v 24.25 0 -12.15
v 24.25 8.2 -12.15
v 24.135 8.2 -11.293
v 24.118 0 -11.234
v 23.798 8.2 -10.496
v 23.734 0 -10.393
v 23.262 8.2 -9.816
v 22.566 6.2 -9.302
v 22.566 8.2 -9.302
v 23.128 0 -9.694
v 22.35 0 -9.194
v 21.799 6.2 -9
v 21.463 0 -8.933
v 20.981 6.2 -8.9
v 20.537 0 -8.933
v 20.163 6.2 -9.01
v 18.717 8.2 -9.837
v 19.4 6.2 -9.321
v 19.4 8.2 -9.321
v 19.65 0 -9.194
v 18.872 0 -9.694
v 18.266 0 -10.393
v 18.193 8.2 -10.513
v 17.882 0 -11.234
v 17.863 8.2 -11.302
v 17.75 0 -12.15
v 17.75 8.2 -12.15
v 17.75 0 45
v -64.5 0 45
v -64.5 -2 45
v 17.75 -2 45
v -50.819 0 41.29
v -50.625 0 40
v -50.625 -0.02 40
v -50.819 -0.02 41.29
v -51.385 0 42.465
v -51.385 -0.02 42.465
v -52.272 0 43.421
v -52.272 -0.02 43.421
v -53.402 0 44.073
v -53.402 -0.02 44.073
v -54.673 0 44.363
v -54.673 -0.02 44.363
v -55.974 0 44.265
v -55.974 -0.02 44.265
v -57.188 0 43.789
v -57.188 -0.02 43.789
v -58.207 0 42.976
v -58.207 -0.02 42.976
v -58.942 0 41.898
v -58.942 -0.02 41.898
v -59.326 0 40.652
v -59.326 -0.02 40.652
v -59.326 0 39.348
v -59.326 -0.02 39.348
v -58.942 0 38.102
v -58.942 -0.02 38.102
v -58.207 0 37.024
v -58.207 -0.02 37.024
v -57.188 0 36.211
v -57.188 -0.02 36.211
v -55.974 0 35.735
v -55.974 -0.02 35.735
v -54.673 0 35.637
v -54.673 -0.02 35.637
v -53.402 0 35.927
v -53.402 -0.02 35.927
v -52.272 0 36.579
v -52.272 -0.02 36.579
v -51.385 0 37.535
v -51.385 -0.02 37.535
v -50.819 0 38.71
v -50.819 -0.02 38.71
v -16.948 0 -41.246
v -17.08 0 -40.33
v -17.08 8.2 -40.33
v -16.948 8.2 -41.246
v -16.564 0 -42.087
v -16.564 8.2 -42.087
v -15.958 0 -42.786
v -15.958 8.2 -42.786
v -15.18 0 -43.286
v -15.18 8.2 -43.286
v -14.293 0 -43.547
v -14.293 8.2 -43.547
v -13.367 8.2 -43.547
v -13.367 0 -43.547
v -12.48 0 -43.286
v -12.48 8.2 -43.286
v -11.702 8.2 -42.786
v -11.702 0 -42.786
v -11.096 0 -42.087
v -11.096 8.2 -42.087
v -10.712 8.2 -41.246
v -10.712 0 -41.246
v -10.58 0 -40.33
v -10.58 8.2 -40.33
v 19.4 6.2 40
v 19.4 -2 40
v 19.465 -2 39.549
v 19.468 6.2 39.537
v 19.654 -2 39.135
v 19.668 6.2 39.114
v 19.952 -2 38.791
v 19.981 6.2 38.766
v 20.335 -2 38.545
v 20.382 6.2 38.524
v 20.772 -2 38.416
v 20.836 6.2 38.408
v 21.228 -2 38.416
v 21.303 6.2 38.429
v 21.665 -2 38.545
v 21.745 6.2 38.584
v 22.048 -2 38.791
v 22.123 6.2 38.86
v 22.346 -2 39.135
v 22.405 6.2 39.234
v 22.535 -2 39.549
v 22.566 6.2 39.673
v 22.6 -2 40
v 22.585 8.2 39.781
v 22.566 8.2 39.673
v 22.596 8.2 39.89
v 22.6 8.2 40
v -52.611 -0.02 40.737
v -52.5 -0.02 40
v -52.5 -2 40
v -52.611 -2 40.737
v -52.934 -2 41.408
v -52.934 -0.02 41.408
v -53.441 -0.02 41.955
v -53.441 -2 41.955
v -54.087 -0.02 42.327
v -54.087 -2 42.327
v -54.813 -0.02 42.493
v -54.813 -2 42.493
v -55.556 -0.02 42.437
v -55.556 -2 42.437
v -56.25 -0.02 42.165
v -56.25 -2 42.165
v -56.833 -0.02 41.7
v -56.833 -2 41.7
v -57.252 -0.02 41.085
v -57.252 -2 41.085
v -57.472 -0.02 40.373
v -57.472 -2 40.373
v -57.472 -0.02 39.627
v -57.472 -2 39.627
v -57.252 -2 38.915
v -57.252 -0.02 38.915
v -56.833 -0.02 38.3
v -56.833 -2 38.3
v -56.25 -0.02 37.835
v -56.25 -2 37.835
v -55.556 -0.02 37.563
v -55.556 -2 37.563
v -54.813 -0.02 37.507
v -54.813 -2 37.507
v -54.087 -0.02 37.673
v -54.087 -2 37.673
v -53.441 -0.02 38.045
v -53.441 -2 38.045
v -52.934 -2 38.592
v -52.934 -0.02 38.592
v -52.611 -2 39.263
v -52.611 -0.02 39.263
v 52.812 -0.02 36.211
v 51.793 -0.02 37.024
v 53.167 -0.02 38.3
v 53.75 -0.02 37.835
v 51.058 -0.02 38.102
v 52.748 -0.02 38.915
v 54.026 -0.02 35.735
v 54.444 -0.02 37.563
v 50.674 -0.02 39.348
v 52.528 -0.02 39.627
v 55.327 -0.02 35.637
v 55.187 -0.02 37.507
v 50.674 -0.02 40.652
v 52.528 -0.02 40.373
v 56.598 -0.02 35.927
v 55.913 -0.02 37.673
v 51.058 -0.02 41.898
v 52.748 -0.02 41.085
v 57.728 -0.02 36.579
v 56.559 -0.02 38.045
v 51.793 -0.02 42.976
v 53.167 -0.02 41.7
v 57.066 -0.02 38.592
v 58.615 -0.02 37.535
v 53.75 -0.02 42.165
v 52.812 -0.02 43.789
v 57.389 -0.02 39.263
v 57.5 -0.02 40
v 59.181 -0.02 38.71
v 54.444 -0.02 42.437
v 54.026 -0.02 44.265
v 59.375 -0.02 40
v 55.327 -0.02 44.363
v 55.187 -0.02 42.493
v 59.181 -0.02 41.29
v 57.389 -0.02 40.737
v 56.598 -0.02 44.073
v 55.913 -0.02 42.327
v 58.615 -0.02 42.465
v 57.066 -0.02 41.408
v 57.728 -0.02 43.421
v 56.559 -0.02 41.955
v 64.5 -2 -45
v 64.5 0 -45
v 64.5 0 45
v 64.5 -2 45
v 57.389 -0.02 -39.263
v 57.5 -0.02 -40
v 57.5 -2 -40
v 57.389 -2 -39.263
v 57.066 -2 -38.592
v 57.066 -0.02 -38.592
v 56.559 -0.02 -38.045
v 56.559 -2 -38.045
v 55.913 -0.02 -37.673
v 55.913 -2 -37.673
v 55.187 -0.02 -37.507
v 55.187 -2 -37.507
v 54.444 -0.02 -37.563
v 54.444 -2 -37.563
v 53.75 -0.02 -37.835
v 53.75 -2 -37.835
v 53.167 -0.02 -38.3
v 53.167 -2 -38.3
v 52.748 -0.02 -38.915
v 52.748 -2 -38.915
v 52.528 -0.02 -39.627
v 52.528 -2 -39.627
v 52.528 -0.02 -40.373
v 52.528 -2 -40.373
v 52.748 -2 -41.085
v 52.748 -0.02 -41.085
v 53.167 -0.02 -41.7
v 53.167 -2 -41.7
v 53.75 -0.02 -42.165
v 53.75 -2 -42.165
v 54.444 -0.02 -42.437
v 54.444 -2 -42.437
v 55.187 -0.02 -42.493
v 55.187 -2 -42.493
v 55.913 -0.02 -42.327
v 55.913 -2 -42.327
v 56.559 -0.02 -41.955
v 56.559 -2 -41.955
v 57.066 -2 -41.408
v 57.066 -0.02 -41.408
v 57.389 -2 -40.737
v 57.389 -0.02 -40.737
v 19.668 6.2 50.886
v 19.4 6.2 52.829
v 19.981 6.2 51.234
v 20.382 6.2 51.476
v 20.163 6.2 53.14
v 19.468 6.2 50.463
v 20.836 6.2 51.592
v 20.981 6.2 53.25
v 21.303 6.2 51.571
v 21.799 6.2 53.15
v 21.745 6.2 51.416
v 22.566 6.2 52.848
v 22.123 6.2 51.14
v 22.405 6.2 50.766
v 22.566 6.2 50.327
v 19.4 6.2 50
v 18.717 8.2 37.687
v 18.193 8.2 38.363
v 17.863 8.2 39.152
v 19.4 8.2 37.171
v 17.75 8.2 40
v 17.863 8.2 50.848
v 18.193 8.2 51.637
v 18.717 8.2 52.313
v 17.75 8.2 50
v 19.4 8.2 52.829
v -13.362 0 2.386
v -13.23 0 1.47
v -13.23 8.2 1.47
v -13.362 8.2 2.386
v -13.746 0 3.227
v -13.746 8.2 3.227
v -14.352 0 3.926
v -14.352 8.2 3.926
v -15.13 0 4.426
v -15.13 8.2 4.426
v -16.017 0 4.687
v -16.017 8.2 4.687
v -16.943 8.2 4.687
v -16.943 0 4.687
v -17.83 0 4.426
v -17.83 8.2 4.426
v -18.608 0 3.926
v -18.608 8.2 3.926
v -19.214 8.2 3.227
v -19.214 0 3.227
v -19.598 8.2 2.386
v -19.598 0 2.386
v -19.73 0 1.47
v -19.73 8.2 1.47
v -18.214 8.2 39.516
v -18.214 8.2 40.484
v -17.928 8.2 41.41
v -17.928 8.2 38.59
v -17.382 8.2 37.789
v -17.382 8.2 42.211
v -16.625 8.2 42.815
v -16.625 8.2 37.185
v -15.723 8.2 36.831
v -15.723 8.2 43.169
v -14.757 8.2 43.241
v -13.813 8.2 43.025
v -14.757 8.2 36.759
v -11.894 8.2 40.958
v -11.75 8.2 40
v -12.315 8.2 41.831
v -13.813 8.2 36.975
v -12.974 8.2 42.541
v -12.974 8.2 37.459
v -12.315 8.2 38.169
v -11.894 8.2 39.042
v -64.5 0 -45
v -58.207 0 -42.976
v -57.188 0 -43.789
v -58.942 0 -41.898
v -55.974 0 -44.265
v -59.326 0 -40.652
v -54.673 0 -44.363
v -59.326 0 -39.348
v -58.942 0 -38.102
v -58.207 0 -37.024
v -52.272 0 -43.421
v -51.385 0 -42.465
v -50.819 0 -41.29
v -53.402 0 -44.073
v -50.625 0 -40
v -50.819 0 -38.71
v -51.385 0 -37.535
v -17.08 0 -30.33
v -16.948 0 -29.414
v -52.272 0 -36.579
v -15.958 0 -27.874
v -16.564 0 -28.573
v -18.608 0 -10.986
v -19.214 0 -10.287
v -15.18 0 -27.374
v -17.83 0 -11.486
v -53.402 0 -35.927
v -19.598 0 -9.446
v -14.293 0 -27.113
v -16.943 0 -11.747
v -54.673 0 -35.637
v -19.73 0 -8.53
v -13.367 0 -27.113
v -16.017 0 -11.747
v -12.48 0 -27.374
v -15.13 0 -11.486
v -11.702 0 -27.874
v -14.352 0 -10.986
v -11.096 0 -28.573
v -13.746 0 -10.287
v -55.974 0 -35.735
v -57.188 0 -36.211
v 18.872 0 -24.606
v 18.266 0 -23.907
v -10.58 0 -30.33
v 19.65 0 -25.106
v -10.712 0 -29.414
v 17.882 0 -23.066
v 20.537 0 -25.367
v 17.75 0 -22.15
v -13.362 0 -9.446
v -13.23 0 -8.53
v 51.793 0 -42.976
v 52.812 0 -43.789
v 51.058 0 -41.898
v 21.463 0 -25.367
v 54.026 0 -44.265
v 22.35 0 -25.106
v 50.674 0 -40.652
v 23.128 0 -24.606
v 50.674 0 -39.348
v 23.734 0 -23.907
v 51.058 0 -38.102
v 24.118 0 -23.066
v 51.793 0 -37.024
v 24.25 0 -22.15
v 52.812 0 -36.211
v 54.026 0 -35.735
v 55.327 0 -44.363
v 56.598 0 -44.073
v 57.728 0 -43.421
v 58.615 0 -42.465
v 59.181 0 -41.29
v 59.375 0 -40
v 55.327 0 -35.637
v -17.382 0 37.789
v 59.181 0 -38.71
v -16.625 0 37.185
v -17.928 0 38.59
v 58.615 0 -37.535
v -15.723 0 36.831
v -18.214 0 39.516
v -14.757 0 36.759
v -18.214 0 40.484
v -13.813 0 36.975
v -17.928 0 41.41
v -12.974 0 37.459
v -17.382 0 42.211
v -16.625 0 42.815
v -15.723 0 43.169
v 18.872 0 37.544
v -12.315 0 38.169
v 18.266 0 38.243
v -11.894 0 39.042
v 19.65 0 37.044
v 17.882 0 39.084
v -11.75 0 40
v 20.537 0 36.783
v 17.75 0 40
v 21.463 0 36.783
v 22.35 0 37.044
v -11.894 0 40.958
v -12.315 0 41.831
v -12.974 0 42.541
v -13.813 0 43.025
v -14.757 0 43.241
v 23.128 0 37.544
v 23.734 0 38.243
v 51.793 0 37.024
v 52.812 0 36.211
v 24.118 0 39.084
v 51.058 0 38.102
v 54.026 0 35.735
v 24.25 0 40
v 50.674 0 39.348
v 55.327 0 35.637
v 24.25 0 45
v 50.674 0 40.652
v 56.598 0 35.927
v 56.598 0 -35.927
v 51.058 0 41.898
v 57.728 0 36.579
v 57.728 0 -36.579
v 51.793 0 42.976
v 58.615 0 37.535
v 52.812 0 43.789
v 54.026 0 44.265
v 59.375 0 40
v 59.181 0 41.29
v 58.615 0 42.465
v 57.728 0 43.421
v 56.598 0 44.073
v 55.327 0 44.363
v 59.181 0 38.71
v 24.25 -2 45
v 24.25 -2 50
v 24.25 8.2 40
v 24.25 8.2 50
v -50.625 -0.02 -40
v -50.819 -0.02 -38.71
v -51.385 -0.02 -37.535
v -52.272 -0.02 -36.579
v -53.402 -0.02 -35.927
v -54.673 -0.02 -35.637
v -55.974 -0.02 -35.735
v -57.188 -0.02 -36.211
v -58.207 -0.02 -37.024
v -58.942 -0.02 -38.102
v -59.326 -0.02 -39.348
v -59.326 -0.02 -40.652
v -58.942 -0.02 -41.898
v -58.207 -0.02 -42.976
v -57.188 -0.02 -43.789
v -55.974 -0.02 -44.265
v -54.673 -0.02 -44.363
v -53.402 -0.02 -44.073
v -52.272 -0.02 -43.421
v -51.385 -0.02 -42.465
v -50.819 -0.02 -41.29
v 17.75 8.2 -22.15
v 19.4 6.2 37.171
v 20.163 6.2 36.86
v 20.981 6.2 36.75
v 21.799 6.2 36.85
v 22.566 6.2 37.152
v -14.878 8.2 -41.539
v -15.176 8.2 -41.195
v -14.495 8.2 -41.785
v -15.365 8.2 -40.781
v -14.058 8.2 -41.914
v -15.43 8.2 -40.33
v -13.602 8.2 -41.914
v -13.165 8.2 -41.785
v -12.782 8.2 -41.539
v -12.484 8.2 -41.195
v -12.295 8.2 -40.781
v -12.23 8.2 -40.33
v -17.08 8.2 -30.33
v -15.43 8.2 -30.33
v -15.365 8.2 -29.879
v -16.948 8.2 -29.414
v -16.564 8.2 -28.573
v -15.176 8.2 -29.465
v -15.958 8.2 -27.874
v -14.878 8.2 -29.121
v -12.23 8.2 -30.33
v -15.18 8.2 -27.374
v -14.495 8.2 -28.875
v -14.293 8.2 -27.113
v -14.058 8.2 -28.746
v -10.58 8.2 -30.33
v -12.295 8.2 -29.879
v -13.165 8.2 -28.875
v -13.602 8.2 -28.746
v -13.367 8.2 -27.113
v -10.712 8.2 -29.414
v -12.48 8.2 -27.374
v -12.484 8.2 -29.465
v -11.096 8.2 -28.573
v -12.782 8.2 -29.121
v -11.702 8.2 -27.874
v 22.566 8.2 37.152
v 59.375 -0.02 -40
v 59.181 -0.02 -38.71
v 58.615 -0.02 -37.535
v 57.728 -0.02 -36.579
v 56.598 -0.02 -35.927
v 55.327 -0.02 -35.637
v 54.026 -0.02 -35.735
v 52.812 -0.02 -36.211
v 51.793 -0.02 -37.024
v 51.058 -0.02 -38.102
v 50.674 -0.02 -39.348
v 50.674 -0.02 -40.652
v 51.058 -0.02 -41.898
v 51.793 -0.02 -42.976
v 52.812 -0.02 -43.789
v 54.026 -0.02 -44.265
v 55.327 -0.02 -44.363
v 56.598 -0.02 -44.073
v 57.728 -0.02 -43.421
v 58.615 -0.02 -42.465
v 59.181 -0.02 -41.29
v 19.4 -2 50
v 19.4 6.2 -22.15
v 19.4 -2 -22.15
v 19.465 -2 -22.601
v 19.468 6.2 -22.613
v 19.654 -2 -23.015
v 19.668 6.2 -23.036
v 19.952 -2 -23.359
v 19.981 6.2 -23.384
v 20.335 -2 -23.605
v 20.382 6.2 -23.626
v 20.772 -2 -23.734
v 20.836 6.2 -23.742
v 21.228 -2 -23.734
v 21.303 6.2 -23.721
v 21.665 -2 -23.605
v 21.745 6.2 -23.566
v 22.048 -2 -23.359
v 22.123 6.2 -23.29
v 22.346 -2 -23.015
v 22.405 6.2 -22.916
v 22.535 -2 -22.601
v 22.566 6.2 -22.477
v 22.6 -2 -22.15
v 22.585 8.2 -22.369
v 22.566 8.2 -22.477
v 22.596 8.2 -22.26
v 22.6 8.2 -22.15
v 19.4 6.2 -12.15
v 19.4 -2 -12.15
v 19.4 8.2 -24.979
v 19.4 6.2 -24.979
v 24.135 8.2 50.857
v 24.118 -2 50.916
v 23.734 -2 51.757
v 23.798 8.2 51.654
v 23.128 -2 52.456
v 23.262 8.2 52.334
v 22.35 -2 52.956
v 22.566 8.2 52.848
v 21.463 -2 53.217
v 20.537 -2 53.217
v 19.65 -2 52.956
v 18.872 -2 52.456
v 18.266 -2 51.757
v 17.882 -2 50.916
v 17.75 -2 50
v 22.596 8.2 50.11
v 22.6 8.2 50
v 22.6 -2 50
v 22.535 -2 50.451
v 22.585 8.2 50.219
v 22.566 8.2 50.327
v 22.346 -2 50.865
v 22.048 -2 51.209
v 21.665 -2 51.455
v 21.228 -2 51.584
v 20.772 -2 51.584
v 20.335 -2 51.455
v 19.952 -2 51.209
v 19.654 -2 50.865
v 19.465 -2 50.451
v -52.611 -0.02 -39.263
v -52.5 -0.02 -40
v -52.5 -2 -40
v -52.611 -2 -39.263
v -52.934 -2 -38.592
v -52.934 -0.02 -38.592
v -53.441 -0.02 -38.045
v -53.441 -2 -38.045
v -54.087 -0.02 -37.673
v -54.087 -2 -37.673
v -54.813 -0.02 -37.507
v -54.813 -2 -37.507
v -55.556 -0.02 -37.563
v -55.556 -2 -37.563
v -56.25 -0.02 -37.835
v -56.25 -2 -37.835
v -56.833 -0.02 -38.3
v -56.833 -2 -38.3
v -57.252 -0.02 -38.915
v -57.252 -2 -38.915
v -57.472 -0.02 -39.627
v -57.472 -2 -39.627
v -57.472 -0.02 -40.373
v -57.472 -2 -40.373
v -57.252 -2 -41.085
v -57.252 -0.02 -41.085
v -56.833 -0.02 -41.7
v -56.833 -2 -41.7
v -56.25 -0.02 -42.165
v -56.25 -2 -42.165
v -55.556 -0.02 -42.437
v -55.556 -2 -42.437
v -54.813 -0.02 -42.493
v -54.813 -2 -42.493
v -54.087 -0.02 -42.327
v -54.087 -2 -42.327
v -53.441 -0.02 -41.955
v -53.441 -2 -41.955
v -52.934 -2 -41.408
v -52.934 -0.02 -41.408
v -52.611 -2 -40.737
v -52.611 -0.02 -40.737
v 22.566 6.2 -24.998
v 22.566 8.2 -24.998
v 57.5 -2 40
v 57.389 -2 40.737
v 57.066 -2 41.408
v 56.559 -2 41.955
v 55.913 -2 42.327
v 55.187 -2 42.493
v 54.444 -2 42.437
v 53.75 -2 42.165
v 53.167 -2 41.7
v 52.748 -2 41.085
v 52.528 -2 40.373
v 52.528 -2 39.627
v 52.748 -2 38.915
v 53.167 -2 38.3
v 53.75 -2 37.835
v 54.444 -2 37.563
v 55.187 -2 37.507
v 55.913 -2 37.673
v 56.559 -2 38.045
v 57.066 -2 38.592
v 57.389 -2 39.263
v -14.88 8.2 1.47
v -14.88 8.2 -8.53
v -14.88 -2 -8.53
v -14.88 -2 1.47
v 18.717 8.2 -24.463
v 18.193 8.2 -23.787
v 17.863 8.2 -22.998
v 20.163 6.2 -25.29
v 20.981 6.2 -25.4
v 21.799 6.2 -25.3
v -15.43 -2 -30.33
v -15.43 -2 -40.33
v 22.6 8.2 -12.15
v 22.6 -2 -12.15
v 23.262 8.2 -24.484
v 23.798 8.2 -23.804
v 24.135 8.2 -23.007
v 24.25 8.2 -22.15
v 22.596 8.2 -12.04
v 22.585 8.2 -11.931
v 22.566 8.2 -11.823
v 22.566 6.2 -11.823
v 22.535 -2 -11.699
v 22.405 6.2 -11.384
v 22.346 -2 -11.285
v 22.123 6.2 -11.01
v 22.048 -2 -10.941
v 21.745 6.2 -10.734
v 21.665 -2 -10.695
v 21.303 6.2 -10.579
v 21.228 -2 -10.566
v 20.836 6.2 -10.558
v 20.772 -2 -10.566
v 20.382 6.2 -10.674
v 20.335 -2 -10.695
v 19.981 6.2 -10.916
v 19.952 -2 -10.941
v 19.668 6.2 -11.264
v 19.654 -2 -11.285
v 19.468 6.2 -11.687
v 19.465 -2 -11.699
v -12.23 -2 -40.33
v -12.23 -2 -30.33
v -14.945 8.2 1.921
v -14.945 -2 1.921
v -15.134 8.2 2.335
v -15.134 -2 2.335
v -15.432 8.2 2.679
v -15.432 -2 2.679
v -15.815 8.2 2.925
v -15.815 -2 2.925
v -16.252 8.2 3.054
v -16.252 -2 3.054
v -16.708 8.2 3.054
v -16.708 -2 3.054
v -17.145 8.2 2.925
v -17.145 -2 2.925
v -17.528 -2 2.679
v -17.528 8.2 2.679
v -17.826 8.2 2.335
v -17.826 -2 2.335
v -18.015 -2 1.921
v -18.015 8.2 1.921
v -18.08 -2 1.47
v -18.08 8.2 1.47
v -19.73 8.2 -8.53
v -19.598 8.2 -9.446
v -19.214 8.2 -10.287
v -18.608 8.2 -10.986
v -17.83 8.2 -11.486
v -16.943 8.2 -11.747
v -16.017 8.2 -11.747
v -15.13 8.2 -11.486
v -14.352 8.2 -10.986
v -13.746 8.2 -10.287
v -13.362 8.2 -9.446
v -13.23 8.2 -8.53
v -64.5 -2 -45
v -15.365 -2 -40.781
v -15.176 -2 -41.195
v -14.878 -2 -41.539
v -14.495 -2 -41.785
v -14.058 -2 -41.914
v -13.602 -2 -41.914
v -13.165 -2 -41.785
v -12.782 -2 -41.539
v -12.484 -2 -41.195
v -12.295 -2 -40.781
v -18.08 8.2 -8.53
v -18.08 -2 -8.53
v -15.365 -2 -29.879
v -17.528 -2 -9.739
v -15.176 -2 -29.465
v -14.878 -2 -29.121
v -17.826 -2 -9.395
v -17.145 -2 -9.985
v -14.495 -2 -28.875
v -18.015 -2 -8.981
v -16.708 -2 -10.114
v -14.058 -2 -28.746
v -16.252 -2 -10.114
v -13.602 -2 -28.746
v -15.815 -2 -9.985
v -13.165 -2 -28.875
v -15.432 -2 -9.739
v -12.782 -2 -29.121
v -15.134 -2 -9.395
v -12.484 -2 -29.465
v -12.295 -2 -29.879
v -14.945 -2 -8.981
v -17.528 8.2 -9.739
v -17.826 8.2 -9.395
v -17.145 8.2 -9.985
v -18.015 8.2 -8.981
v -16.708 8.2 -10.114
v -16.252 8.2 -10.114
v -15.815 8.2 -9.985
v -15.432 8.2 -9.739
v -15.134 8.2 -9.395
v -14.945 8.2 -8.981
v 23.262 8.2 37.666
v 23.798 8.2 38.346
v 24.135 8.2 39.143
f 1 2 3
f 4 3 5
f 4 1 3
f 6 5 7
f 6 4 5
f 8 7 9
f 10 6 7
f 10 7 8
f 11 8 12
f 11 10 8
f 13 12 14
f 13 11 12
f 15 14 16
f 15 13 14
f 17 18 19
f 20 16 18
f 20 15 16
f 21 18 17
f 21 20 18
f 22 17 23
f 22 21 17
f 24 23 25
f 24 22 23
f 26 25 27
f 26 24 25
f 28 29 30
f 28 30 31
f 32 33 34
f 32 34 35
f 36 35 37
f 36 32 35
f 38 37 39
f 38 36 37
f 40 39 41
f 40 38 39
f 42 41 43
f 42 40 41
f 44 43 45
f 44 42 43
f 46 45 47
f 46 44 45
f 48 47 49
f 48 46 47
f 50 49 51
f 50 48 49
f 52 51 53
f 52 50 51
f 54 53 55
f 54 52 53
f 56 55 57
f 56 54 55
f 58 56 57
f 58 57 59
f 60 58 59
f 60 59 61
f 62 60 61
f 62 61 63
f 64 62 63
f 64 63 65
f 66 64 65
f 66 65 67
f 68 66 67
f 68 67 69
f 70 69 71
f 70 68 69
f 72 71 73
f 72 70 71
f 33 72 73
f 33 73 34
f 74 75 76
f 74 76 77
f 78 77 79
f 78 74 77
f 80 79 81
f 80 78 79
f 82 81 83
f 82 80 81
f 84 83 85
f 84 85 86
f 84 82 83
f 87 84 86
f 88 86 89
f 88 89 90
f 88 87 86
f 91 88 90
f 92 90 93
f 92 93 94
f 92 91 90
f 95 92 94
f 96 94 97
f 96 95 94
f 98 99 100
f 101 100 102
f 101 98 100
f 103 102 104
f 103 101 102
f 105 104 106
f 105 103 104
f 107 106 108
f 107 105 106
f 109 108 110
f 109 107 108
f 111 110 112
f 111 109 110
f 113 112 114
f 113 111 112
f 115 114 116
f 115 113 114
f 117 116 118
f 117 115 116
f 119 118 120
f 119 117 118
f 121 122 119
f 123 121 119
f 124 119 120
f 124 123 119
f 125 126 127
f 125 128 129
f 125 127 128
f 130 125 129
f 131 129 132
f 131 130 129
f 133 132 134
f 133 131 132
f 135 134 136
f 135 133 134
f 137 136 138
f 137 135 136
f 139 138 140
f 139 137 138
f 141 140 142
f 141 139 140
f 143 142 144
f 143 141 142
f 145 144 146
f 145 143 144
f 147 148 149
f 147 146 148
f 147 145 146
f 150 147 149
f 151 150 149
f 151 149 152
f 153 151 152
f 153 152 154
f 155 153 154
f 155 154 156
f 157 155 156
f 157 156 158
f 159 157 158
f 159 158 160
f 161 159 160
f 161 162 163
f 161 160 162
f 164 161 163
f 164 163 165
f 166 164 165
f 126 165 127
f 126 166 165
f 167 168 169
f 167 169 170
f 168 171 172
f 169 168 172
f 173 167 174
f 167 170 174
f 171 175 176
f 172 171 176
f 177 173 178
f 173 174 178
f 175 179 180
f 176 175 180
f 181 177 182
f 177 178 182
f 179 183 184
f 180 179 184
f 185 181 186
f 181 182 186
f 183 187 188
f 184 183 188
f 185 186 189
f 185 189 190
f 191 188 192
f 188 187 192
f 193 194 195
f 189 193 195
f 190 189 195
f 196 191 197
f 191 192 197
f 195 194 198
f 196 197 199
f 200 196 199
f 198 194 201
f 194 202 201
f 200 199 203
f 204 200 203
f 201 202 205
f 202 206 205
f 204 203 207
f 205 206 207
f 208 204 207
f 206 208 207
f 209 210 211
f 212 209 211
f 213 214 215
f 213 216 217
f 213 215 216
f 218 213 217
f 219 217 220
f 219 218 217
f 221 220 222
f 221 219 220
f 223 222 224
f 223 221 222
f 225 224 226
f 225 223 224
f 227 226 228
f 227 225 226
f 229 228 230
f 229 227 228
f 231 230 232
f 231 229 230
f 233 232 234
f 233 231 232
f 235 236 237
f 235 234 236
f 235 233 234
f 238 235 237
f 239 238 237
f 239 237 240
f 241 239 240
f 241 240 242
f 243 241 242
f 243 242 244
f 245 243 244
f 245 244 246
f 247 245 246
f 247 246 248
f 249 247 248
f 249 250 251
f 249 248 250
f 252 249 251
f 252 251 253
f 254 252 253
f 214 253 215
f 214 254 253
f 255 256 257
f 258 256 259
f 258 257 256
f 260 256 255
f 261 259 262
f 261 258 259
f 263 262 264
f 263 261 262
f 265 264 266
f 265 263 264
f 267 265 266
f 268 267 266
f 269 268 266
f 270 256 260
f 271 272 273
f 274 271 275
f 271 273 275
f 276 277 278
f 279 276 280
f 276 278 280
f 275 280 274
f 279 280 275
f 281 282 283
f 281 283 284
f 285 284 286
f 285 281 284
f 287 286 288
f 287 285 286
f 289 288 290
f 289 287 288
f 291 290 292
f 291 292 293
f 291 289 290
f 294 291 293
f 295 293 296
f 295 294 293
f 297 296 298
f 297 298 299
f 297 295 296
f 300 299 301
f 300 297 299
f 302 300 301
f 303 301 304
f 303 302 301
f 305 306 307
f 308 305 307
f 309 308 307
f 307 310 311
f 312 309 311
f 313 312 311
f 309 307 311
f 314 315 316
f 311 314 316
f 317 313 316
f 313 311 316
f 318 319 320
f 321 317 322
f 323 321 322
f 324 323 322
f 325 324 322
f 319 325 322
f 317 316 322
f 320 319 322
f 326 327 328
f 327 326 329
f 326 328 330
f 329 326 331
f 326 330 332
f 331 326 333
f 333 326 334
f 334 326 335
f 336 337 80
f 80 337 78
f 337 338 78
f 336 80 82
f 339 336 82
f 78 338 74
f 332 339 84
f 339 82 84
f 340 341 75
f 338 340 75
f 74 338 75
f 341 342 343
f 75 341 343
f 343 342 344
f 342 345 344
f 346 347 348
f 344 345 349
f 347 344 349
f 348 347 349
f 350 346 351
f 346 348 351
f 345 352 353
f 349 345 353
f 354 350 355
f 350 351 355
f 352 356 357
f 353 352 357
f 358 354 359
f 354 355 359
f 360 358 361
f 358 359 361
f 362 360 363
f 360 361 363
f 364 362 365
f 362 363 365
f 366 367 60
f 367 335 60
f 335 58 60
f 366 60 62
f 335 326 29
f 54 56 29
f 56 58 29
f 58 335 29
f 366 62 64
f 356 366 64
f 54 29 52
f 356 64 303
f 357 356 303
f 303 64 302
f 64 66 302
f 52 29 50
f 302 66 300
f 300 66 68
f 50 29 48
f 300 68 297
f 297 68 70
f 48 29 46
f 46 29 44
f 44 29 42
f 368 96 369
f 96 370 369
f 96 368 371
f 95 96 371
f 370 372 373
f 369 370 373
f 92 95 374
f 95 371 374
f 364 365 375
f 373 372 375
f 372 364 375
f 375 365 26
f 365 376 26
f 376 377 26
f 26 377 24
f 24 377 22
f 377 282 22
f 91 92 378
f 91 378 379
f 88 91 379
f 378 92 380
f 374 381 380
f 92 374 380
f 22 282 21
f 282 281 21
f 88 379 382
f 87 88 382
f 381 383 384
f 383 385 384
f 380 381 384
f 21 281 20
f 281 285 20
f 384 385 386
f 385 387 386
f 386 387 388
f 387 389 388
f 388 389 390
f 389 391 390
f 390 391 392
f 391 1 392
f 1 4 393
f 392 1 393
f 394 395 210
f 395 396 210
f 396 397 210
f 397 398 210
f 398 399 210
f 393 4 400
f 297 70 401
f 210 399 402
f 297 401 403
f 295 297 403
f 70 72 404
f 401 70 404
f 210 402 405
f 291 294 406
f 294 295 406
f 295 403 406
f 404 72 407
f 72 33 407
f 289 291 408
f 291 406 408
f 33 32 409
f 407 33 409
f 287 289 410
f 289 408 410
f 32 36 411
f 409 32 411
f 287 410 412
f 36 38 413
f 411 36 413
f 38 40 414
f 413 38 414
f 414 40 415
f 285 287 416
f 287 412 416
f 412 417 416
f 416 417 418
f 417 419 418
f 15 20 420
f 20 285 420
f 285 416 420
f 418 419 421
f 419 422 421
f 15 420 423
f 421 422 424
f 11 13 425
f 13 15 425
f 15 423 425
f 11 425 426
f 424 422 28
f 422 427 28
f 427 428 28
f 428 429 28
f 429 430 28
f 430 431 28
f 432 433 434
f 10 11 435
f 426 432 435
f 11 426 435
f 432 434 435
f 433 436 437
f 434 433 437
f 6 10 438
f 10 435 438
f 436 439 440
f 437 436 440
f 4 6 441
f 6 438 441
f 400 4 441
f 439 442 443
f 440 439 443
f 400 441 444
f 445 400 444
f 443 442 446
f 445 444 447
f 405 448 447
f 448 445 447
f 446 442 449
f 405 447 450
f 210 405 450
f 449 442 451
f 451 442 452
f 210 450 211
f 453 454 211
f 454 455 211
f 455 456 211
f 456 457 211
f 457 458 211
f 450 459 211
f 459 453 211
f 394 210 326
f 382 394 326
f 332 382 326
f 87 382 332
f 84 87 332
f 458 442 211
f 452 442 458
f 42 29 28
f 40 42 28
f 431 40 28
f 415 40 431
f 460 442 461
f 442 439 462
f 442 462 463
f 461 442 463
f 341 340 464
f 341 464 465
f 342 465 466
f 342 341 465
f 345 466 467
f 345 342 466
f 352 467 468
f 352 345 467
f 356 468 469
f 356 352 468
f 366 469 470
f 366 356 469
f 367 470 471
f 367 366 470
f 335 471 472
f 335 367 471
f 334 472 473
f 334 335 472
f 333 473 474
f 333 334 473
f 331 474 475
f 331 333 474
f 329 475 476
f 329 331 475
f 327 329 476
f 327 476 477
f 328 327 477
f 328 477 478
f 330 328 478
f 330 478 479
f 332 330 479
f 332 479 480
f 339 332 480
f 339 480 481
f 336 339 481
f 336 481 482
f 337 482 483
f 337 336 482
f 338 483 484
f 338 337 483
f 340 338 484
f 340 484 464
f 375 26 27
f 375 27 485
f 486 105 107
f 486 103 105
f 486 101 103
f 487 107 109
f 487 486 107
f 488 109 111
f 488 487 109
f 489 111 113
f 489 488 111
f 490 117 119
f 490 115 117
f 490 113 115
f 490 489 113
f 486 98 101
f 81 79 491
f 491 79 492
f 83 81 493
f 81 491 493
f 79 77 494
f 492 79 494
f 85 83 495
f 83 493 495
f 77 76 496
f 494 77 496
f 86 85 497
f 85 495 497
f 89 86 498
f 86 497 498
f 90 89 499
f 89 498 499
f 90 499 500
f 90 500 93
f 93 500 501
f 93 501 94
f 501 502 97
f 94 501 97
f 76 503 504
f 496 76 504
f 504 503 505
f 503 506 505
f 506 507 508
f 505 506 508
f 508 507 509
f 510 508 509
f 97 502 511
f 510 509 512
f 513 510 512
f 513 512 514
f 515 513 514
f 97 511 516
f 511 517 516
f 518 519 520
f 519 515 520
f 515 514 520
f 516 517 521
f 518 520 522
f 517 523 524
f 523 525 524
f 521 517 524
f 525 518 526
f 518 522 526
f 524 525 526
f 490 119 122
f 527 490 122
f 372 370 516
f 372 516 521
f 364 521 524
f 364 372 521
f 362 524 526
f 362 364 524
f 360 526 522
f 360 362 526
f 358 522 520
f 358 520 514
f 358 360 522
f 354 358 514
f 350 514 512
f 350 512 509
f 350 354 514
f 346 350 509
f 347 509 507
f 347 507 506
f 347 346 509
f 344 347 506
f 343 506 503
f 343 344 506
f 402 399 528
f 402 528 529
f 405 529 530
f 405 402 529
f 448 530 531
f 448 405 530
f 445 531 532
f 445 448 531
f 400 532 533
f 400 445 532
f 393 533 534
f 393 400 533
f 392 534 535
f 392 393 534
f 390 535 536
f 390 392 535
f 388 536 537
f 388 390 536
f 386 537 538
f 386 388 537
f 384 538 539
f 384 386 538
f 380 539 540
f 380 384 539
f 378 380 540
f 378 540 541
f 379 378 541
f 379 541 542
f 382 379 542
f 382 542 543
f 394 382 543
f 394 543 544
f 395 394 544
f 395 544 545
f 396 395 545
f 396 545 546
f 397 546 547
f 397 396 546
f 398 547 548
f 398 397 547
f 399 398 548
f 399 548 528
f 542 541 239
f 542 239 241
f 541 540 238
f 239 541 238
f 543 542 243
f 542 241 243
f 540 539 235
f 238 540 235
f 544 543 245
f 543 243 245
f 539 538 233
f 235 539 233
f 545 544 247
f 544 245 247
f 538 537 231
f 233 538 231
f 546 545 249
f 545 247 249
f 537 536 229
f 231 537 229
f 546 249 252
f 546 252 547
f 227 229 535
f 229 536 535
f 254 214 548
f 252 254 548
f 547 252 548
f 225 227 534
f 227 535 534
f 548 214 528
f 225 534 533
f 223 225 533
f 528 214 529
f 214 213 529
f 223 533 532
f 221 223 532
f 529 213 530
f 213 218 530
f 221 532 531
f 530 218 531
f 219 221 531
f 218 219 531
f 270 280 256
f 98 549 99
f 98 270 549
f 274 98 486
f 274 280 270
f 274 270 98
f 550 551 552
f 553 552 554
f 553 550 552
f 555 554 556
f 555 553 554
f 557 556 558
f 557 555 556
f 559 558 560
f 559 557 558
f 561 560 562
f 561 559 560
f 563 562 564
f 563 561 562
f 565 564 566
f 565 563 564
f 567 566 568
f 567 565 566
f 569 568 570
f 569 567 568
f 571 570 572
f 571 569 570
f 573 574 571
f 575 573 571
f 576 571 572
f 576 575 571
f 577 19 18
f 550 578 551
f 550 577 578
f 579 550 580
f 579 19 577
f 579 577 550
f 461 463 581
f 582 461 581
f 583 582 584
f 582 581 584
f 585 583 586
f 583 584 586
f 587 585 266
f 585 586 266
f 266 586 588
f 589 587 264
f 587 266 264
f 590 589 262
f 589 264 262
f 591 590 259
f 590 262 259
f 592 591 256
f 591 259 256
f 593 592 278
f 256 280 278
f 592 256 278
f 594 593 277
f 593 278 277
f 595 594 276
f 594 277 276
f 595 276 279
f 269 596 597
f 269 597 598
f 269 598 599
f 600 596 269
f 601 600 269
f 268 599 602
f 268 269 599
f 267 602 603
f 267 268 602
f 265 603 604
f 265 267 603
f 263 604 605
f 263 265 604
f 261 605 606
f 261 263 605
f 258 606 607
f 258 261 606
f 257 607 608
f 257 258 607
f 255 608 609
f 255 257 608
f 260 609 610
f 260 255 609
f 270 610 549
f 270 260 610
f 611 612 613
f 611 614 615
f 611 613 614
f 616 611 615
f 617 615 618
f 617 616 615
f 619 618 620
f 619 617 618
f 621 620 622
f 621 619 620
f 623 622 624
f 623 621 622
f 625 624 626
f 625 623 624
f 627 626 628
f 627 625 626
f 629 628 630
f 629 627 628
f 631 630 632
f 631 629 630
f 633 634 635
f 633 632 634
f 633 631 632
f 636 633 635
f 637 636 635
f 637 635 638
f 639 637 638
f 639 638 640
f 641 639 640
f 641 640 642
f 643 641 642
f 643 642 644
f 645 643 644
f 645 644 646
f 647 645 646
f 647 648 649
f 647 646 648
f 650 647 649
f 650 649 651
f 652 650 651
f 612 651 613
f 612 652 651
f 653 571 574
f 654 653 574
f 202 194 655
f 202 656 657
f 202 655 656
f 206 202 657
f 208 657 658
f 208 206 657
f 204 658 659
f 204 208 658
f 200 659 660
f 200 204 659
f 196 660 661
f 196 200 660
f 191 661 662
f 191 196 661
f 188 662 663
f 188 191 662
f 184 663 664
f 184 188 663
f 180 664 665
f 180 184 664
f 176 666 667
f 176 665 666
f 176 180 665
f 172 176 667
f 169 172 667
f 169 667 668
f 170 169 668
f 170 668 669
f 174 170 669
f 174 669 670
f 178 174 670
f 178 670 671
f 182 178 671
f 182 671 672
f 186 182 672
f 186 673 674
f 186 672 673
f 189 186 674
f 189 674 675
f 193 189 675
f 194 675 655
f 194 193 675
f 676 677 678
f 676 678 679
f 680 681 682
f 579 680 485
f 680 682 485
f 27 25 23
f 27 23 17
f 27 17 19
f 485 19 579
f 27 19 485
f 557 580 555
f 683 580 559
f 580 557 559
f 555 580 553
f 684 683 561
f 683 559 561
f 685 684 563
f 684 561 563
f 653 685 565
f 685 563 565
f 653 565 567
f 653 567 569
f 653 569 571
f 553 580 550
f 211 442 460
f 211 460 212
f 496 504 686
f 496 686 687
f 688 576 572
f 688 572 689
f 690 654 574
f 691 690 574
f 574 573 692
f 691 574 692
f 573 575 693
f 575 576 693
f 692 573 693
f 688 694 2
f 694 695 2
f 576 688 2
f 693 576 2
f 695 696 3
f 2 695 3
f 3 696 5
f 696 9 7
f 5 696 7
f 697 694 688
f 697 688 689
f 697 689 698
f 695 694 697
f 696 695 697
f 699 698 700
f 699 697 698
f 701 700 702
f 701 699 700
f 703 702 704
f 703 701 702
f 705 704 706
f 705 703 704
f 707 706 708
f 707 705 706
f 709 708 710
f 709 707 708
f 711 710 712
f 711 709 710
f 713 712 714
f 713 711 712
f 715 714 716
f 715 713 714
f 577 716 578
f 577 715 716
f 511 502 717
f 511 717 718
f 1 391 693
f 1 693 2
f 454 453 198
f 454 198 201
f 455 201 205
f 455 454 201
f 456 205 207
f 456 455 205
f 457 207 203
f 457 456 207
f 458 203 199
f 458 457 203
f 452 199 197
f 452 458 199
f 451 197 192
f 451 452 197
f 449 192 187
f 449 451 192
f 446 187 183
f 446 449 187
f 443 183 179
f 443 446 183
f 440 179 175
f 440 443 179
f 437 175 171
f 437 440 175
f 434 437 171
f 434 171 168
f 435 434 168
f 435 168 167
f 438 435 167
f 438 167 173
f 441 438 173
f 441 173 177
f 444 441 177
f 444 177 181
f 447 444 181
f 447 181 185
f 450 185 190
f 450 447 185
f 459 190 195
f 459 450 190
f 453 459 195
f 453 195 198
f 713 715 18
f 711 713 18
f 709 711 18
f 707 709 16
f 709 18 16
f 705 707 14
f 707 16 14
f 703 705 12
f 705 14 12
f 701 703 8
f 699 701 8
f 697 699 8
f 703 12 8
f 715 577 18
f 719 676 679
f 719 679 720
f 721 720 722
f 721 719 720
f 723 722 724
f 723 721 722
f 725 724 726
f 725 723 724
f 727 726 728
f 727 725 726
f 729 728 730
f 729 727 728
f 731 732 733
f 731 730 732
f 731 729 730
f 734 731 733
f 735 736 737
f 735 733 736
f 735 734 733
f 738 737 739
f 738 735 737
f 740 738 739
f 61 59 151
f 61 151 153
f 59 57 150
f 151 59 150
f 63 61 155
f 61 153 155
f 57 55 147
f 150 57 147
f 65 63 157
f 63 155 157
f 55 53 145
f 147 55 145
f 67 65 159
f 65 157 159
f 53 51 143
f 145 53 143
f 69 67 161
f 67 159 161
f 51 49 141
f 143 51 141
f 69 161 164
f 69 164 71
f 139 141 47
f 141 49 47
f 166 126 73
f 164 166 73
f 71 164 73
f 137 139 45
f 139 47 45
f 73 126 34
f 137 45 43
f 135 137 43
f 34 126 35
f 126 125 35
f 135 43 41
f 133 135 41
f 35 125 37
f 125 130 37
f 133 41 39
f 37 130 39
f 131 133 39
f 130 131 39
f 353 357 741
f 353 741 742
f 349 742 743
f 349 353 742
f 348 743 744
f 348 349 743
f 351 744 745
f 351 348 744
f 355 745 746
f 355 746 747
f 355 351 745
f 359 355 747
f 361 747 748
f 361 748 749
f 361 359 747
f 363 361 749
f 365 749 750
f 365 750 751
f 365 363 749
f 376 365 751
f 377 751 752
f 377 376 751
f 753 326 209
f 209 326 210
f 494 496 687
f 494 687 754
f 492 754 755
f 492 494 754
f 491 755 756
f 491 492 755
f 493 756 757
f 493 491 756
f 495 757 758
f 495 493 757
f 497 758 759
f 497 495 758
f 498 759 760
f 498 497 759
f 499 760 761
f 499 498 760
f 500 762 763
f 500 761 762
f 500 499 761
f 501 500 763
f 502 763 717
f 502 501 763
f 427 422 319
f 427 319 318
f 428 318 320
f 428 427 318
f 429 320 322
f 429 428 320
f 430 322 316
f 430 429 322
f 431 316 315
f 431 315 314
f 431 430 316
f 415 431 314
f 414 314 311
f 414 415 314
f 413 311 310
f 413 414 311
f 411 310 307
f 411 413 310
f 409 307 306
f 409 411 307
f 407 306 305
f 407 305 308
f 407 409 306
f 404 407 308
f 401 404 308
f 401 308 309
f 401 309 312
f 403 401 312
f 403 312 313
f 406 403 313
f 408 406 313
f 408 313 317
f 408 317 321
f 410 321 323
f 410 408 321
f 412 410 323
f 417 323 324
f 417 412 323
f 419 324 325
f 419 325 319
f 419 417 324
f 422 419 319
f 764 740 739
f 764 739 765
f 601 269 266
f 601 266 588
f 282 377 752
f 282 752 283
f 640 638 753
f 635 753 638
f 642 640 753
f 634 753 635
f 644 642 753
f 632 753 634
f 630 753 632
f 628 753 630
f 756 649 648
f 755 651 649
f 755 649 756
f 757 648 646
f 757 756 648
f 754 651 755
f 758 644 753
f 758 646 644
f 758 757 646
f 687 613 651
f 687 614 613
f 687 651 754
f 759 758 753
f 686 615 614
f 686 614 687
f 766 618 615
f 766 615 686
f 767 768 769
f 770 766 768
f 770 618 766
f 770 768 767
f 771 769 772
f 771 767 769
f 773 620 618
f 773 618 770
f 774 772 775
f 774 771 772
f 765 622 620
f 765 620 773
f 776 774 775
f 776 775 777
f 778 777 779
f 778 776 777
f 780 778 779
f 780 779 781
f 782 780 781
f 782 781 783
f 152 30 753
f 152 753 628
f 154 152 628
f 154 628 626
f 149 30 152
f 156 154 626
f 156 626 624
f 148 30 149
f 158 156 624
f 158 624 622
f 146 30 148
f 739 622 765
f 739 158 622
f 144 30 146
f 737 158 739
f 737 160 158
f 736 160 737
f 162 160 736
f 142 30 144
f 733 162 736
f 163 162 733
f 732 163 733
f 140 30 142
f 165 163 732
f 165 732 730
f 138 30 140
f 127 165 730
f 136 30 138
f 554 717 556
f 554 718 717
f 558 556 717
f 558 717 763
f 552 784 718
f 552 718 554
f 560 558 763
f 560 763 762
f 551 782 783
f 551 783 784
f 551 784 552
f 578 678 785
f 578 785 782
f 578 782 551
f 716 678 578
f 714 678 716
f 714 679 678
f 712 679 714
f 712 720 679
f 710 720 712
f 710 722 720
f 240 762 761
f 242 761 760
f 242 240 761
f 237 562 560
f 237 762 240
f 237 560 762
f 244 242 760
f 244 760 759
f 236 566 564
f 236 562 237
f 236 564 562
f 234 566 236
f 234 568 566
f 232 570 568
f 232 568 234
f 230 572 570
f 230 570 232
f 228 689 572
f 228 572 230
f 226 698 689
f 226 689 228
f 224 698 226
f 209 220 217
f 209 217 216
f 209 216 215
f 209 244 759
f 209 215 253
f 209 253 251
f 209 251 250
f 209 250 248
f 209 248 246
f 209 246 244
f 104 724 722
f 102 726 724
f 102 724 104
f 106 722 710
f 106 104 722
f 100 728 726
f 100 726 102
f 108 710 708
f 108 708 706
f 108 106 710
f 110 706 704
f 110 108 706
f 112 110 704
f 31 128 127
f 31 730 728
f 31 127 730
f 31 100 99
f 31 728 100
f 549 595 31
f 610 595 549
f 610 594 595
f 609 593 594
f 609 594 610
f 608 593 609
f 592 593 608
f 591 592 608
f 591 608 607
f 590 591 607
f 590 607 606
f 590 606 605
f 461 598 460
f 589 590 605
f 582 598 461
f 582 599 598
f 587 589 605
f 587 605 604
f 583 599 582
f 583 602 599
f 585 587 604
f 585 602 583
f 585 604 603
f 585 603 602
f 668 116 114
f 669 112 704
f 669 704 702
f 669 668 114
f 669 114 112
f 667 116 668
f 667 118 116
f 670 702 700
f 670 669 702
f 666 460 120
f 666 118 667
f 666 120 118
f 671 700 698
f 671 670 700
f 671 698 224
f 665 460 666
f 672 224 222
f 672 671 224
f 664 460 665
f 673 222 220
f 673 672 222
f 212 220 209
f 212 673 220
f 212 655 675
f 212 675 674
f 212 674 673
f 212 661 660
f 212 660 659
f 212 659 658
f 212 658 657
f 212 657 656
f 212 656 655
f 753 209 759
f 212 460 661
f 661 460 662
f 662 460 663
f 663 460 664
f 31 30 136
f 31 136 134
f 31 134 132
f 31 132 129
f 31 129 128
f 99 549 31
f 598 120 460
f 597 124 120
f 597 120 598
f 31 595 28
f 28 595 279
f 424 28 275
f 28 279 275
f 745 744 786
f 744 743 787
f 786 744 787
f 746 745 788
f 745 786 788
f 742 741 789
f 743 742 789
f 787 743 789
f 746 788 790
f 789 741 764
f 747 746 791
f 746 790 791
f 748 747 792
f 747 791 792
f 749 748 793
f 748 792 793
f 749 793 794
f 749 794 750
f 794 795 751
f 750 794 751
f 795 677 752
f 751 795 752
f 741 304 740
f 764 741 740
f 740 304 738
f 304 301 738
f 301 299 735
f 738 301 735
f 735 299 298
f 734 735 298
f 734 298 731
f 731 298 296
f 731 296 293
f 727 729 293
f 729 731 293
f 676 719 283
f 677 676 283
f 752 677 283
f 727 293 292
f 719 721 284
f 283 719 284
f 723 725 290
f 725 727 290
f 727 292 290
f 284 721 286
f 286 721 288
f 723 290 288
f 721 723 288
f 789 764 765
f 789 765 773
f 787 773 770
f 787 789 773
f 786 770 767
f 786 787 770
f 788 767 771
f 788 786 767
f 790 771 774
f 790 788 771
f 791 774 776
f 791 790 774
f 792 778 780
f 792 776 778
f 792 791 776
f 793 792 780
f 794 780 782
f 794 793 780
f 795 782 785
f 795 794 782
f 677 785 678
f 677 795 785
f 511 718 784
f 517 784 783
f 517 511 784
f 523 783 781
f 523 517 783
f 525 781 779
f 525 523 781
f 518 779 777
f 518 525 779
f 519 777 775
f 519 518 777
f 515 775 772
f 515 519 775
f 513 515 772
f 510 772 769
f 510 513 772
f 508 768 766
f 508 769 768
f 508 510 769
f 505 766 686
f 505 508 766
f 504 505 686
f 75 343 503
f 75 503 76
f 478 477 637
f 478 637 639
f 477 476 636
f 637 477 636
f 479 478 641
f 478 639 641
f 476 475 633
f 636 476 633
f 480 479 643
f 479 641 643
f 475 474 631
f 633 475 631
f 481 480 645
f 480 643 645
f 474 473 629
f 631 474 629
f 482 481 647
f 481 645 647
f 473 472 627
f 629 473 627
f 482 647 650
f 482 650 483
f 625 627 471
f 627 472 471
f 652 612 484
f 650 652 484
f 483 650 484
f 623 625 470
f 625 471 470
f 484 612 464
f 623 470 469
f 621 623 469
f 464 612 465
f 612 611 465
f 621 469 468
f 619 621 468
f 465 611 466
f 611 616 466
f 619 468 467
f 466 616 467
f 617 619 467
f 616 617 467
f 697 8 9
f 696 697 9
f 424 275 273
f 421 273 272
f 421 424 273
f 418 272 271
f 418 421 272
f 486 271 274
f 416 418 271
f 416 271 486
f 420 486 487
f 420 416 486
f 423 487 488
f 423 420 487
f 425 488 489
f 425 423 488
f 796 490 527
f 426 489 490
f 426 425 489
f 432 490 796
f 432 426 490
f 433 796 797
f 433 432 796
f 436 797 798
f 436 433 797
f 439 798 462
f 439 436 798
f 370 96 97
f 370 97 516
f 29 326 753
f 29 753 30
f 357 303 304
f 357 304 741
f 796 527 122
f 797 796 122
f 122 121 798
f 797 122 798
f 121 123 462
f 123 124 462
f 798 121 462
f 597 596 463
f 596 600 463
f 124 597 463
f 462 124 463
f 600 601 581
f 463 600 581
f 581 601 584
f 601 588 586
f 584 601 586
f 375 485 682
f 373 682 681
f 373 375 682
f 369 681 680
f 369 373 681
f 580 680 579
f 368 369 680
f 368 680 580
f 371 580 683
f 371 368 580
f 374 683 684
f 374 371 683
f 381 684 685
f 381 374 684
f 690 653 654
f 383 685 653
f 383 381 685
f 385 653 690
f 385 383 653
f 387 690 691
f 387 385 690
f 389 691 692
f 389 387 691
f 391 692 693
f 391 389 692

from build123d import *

# Parameters (mm, degrees)
SKETCH_W             = 129
SKETCH_H             = 90
PAD_DEPTH            = 2
SKETCH001_R          = 2.5
POCKET_DEPTH         = 2.001
SKETCH002_R          = 4.375
POCKET001_DEPTH      = 0.02
SKETCH003_R          = 3.25
PAD001_DEPTH         = 8.2
PAD001_DEPTH_BACK    = -2
POCKET002_DEPTH      = 10
POCKET002_DEPTH_BACK = -5
SKETCH005_W          = 3.16625
SKETCH005_H          = 2
POCKET003_DEPTH      = 45.001
POCKET004_DEPTH      = 53.251


with BuildPart() as part:
    # Sketch → Pad (new body)
    with BuildSketch(Plane.XZ):
        Rectangle(SKETCH_W, SKETCH_H)
    extrude(amount=PAD_DEPTH)

    # Sketch001 → Pocket (cut, through all)
    with BuildSketch(Plane.XZ):
        with Locations((55, 40)):
            Circle(SKETCH001_R)
        with Locations((-55, 40)):
            Circle(SKETCH001_R)
        with Locations((55, -40)):
            Circle(SKETCH001_R)
        with Locations((-55, -40)):
            Circle(SKETCH001_R)
    extrude(amount=POCKET_DEPTH, mode=Mode.SUBTRACT)

    # Sketch002 → Pocket001 (cut)
    with BuildSketch(Plane.XZ):
        with Locations((55, 40)):
            Circle(SKETCH002_R)
        with Locations((-55, 40)):
            Circle(SKETCH002_R)
        with Locations((55, -40)):
            Circle(SKETCH002_R)
        with Locations((-55, -40)):
            Circle(SKETCH002_R)
    extrude(amount=POCKET001_DEPTH, mode=Mode.SUBTRACT)

    # Sketch003 → Pad001 (join, two sides)
    with BuildSketch(Plane.XZ) as pad001_sk:
        with Locations((-15, 40)):
            Circle(SKETCH003_R)
        with BuildLine():
            ThreePointArc((24.25, 50), (21, 53.25), (17.75, 50))
            Line((17.75, 50), (17.75, 40))
            ThreePointArc((17.75, 40), (21, 36.75), (24.25, 40))
            Line((24.25, 40), (24.25, 50))
        make_face()
        with BuildLine():
            ThreePointArc((-13.23, 1.47), (-16.48, 4.72), (-19.73, 1.47))
            Line((-19.73, 1.47), (-19.73, -8.53))
            ThreePointArc((-19.73, -8.53), (-16.48, -11.78), (-13.23, -8.53))
            Line((-13.23, -8.53), (-13.23, 1.47))
        make_face()
        with BuildLine():
            ThreePointArc((-10.58, -30.33), (-13.83, -27.08), (-17.08, -30.33))
            Line((-17.08, -30.33), (-17.08, -40.33))
            ThreePointArc((-17.08, -40.33), (-13.83, -43.58), (-10.58, -40.33))
            Line((-10.58, -40.33), (-10.58, -30.33))
        make_face()
        with BuildLine():
            ThreePointArc((24.25, -12.15), (21, -8.9), (17.75, -12.15))
            Line((17.75, -12.15), (17.75, -22.15))
            ThreePointArc((17.75, -22.15), (21, -25.4), (24.25, -22.15))
            Line((24.25, -22.15), (24.25, -12.15))
        make_face()
    extrude(amount=-PAD001_DEPTH)
    extrude(pad001_sk.sketch, amount=-PAD001_DEPTH_BACK)

    # Sketch004 → Pocket002 (cut, two sides)
    with BuildSketch(Plane.XZ) as pocket002_sk:
        with BuildLine():
            ThreePointArc((22.6, 50), (21, 51.6), (19.4, 50))
            Line((19.4, 50), (19.4, 40))
            ThreePointArc((19.4, 40), (21, 38.4), (22.6, 40))
            Line((22.6, 40), (22.6, 50))
        make_face()
        with BuildLine():
            ThreePointArc((-14.88, 1.47), (-16.48, 3.07), (-18.08, 1.47))
            Line((-18.08, 1.47), (-18.08, -8.53))
            ThreePointArc((-18.08, -8.53), (-16.48, -10.13), (-14.88, -8.53))
            Line((-14.88, -8.53), (-14.88, 1.47))
        make_face()
        with BuildLine():
            ThreePointArc((-12.23, -30.33), (-13.83, -28.73), (-15.43, -30.33))
            Line((-15.43, -30.33), (-15.43, -40.33))
            ThreePointArc((-15.43, -40.33), (-13.83, -41.93), (-12.23, -40.33))
            Line((-12.23, -40.33), (-12.23, -30.33))
        make_face()
        with BuildLine():
            ThreePointArc((22.6, -12.15), (21, -10.55), (19.4, -12.15))
            Line((19.4, -12.15), (19.4, -22.15))
            ThreePointArc((19.4, -22.15), (21, -23.75), (22.6, -22.15))
            Line((22.6, -22.15), (22.6, -12.15))
        make_face()
    extrude(amount=-POCKET002_DEPTH, mode=Mode.SUBTRACT)
    extrude(pocket002_sk.sketch, amount=-POCKET002_DEPTH_BACK, mode=Mode.SUBTRACT)

    # Sketch005 → Pocket003 (cut, through all)
    with BuildSketch(Plane.XY):
        with Locations((20.983125, 7.2)):
            Rectangle(SKETCH005_W, SKETCH005_H)
    extrude(amount=-POCKET003_DEPTH, mode=Mode.SUBTRACT)

    # Sketch005 → Pocket004 (cut, through all)
    with BuildSketch(Plane.XY):
        with Locations((20.983125, 7.2)):
            Rectangle(SKETCH005_W, SKETCH005_H)
    extrude(amount=POCKET004_DEPTH, mode=Mode.SUBTRACT)


solid = part.part
